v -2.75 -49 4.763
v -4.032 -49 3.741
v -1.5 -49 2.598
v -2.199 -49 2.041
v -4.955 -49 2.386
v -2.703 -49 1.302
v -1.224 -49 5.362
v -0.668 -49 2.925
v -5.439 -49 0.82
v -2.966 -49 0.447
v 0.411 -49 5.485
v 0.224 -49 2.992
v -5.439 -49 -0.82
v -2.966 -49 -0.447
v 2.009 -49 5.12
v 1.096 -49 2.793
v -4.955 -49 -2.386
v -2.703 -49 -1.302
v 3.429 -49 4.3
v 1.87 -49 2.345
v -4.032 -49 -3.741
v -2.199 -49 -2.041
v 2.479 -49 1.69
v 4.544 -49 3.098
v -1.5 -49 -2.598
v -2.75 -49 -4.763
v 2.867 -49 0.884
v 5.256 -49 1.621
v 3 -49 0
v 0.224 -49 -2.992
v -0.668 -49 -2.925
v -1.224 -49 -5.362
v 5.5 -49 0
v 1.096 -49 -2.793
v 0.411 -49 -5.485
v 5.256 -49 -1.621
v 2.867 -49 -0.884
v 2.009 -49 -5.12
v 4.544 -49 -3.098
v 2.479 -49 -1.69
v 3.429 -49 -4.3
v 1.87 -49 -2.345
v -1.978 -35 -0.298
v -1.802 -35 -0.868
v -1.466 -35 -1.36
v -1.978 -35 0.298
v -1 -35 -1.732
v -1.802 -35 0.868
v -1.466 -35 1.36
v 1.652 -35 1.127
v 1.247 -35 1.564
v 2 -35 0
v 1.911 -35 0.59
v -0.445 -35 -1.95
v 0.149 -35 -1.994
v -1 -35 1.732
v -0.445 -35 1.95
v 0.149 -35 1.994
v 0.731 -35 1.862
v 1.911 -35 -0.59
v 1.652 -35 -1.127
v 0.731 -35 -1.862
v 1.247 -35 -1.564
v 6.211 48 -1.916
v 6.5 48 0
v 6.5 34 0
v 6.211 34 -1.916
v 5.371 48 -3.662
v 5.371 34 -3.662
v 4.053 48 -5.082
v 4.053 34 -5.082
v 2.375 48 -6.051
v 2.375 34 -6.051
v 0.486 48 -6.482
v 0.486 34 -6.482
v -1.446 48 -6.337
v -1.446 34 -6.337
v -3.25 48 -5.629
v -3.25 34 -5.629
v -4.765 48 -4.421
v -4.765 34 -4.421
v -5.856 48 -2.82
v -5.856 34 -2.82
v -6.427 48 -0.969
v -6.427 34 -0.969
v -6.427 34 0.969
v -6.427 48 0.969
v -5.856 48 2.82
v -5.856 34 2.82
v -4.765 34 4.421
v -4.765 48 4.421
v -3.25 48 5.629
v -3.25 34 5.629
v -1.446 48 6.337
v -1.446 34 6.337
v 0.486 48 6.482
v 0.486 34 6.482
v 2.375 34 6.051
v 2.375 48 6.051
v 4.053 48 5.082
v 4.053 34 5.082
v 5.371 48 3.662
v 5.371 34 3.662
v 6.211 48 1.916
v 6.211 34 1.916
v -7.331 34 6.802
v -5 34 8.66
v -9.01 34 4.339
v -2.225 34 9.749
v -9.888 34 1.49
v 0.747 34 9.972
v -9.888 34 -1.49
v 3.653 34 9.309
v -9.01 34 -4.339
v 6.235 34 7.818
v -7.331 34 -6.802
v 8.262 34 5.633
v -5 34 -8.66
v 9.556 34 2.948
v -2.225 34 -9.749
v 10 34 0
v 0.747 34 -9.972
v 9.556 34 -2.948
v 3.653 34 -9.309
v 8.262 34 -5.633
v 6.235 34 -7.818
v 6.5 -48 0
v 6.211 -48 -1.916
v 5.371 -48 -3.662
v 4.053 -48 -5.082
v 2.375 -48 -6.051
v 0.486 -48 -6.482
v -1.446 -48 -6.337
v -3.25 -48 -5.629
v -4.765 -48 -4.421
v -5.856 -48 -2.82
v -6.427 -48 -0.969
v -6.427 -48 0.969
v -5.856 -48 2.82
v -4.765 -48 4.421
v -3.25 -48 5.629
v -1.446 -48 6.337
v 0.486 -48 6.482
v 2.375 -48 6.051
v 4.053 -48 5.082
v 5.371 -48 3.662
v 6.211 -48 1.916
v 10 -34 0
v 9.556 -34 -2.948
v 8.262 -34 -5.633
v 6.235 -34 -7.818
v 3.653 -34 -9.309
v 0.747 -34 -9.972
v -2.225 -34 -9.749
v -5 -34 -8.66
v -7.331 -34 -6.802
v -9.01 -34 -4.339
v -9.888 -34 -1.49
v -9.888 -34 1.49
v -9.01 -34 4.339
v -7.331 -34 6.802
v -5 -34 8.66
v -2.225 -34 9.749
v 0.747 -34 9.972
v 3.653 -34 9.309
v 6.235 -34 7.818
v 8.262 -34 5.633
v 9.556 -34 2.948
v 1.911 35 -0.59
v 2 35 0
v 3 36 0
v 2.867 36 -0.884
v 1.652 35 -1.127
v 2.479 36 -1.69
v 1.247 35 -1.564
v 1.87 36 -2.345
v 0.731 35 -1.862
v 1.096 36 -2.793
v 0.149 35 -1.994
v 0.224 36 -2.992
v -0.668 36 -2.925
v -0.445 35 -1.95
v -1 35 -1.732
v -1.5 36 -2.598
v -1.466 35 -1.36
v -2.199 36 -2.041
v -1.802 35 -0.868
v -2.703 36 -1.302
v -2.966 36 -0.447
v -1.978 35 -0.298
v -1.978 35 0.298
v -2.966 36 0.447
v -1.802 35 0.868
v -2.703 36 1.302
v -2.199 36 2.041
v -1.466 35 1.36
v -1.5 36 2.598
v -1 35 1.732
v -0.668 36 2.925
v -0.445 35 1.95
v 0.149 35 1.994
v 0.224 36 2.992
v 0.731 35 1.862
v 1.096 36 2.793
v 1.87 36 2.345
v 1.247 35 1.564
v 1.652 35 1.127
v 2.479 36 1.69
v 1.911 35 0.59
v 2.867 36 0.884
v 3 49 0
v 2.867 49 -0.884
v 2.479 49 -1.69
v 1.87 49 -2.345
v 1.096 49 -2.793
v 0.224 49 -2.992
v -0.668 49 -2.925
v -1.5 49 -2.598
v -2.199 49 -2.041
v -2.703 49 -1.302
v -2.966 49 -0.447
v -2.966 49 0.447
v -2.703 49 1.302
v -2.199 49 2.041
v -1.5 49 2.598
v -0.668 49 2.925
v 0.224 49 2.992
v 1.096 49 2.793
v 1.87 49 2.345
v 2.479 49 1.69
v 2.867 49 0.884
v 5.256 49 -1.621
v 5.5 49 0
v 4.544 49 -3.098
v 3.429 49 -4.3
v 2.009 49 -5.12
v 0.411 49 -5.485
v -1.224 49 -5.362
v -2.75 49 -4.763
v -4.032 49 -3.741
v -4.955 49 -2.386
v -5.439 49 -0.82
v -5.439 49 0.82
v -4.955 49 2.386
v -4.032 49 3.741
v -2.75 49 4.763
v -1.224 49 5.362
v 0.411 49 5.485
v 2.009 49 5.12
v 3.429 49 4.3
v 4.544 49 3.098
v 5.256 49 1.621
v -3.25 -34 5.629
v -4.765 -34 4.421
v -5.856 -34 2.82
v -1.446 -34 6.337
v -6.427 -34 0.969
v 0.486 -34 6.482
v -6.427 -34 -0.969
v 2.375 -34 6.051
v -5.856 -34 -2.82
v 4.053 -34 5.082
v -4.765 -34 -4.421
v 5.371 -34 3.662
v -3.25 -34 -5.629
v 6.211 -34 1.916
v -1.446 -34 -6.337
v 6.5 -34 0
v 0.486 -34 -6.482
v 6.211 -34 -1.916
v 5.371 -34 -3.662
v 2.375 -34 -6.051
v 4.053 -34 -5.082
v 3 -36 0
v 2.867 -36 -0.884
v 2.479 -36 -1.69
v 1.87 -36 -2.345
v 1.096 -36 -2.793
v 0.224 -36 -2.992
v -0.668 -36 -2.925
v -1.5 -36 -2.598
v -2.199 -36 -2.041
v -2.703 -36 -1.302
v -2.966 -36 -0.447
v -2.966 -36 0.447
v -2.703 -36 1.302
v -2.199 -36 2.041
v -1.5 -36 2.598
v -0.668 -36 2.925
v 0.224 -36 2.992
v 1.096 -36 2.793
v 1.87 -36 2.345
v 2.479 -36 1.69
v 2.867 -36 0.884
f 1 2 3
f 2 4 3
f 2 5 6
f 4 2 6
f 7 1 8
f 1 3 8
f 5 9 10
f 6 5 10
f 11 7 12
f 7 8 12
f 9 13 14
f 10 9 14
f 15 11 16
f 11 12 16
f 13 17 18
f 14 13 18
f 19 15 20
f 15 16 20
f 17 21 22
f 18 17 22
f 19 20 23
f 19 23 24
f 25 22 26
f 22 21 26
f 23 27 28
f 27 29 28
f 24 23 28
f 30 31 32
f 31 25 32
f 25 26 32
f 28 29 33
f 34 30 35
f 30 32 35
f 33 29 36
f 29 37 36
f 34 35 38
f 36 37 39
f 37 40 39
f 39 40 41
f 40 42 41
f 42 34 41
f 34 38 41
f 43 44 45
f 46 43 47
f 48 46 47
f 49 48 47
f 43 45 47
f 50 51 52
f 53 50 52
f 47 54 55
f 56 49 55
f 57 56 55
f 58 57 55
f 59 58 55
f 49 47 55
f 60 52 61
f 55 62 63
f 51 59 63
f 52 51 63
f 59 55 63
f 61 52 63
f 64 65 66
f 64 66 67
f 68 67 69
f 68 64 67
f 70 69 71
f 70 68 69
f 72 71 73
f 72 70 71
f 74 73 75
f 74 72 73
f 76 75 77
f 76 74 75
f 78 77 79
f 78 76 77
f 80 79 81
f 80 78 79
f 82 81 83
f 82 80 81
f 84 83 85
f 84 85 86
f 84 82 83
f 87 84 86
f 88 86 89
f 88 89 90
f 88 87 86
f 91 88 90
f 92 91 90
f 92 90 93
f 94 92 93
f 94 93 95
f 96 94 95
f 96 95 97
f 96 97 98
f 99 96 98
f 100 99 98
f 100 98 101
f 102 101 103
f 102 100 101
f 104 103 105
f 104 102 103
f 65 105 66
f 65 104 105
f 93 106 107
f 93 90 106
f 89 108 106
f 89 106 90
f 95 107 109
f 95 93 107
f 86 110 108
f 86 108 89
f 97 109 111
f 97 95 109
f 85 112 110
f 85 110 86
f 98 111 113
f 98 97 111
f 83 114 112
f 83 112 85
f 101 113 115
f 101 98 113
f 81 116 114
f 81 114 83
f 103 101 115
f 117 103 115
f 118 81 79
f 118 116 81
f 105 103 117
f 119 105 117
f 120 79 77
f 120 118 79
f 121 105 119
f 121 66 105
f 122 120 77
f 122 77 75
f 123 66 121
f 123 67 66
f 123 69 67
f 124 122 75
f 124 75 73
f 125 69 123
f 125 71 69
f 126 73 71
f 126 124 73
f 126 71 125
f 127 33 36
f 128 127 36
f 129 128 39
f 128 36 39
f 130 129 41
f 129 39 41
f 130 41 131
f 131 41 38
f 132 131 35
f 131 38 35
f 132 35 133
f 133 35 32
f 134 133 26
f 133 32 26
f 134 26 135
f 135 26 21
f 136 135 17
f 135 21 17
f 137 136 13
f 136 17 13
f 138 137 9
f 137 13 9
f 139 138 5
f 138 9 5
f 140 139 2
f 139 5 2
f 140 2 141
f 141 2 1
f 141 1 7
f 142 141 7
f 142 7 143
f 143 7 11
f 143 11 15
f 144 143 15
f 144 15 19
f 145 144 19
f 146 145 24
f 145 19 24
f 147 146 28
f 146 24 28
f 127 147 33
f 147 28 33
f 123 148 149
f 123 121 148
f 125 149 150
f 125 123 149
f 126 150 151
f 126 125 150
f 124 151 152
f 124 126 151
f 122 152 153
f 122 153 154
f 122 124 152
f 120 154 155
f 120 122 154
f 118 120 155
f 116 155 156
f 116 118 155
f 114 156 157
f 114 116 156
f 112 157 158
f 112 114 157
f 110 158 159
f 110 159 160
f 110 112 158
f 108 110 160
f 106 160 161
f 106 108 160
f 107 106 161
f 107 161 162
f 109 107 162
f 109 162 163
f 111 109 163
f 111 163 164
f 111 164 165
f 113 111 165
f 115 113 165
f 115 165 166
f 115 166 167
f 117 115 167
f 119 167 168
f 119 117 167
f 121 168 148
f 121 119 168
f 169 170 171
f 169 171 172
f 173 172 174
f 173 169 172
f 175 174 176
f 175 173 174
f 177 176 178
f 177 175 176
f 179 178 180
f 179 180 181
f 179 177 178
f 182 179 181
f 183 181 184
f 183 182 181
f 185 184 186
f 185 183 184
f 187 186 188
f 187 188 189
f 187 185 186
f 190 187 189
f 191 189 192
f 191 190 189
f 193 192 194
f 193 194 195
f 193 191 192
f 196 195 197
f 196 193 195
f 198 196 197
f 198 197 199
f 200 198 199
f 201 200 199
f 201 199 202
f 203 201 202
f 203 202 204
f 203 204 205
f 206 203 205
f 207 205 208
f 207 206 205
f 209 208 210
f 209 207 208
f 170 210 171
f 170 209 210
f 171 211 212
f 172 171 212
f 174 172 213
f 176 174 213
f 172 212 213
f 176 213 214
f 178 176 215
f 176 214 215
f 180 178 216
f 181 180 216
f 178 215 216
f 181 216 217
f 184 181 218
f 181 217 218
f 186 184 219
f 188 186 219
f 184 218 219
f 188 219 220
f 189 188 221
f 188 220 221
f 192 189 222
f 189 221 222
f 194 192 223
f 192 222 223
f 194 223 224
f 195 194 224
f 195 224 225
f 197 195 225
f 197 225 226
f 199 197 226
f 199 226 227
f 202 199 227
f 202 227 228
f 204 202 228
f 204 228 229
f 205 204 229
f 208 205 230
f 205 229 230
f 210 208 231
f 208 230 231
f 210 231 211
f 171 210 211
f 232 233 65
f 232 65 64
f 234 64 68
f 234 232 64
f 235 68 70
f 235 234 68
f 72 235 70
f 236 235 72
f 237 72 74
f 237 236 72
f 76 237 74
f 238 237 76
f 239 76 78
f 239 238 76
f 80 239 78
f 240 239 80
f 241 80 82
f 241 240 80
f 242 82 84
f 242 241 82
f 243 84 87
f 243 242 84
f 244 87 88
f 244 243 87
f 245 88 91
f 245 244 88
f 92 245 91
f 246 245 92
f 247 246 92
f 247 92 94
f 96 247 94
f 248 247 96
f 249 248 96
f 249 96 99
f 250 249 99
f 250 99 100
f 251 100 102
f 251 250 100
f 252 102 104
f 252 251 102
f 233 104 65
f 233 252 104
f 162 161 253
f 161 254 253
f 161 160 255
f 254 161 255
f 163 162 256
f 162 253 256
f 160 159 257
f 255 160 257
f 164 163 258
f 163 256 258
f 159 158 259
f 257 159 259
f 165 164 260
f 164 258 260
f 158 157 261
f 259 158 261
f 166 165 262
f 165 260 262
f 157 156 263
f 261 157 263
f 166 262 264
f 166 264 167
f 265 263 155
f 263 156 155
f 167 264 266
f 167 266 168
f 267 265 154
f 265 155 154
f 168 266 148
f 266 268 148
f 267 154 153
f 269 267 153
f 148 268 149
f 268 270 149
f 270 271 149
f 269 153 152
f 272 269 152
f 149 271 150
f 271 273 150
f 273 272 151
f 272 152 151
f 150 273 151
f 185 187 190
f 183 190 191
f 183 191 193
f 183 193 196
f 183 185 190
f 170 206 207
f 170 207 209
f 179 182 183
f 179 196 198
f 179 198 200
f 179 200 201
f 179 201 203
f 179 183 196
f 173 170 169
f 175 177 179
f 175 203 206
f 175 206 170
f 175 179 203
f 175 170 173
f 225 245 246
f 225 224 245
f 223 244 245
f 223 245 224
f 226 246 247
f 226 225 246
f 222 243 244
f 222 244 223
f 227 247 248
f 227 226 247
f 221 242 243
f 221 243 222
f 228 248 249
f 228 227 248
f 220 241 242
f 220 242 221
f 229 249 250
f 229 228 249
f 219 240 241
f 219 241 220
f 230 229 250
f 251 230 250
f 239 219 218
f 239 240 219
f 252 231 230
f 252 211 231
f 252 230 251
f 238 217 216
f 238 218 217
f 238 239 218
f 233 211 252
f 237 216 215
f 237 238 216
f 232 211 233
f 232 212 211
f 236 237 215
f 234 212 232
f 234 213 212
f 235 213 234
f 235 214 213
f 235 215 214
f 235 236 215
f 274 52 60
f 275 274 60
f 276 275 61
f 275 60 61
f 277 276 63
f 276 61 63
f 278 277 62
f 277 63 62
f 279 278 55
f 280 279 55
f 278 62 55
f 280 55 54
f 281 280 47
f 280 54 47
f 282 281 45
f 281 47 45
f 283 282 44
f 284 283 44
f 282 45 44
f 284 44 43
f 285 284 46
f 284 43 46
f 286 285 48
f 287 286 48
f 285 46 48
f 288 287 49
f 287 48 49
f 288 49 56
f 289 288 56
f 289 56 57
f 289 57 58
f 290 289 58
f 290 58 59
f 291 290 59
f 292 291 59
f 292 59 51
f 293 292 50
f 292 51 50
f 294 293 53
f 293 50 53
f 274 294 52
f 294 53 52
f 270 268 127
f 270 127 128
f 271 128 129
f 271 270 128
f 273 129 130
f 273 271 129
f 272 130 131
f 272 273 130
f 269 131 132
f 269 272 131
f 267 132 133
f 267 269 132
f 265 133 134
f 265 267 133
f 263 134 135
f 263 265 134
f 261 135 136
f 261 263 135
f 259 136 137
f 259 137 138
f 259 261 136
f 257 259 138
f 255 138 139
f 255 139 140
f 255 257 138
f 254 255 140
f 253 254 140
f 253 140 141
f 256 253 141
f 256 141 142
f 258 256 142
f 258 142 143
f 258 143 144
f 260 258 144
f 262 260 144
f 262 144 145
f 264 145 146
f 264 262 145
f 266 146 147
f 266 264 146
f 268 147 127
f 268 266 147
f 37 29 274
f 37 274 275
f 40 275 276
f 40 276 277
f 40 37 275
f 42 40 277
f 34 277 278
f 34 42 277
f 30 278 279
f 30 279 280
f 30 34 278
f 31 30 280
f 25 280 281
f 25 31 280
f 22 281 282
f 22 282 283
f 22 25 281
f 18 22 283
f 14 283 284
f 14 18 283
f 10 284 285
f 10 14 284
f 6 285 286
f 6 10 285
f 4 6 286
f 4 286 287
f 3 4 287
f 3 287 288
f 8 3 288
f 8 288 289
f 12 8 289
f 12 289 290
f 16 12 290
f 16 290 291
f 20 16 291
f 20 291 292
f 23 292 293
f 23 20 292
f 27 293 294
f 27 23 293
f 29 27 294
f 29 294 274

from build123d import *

# Parameters (mm, degrees)
SKETCH_1_R          = 10
EXTRUDE_1_DEPTH     = 34
SKETCH_2_R          = 6.5
EXTRUDE_2_DEPTH     = 49
CHAMFER_1_SIZE      = 1
SKETCH_3_R          = 3
CUT_EXTRUDE_1_DEPTH = 14
CHAMFER_2_SIZE      = 1


with BuildPart() as part:
    # 스케치1 → 보스-돌출1 (new body, symmetric)
    with BuildSketch(Plane(origin=(0, 0, 0), x_dir=(1, 0, 0), z_dir=(0, 1, 0))):
        Circle(SKETCH_1_R)
    extrude(amount=EXTRUDE_1_DEPTH, both=True)

    # 스케치2 → 보스-돌출2 (add, symmetric)
    with BuildSketch(Plane(origin=(0, 0, 0), x_dir=(1, 0, 0), z_dir=(0, 1, 0))):
        Circle(SKETCH_2_R)
    extrude(amount=EXTRUDE_2_DEPTH, both=True)

    # 모따기1
    chamfer_1_edges = [part.edges().sort_by_distance(p)[0] for p in [
        (-6.5, -49, 0),
        (-6.5, 49, 0),
    ]]
    chamfer(chamfer_1_edges, length=CHAMFER_1_SIZE)

    # 스케치3 → 컷-돌출1 (cut)
    with BuildSketch(Plane(origin=(0, 49, 0), x_dir=(1, 0, 0), z_dir=(0, 1, 0))):
        Circle(SKETCH_3_R)
    cut_extrude_1 = extrude(amount=-CUT_EXTRUDE_1_DEPTH, mode=Mode.SUBTRACT)

    # 대칭 복사1: 컷-돌출1 across plane
    add(cut_extrude_1.mirror(Plane.ZX), mode=Mode.SUBTRACT)

    # 모따기2
    chamfer_2_edges = [part.edges().sort_by_distance(p)[0] for p in [
        (-3, 35, 0),
        (-3, -35, 0),
    ]]
    chamfer(chamfer_2_edges, length=CHAMFER_2_SIZE)


solid = part.part
